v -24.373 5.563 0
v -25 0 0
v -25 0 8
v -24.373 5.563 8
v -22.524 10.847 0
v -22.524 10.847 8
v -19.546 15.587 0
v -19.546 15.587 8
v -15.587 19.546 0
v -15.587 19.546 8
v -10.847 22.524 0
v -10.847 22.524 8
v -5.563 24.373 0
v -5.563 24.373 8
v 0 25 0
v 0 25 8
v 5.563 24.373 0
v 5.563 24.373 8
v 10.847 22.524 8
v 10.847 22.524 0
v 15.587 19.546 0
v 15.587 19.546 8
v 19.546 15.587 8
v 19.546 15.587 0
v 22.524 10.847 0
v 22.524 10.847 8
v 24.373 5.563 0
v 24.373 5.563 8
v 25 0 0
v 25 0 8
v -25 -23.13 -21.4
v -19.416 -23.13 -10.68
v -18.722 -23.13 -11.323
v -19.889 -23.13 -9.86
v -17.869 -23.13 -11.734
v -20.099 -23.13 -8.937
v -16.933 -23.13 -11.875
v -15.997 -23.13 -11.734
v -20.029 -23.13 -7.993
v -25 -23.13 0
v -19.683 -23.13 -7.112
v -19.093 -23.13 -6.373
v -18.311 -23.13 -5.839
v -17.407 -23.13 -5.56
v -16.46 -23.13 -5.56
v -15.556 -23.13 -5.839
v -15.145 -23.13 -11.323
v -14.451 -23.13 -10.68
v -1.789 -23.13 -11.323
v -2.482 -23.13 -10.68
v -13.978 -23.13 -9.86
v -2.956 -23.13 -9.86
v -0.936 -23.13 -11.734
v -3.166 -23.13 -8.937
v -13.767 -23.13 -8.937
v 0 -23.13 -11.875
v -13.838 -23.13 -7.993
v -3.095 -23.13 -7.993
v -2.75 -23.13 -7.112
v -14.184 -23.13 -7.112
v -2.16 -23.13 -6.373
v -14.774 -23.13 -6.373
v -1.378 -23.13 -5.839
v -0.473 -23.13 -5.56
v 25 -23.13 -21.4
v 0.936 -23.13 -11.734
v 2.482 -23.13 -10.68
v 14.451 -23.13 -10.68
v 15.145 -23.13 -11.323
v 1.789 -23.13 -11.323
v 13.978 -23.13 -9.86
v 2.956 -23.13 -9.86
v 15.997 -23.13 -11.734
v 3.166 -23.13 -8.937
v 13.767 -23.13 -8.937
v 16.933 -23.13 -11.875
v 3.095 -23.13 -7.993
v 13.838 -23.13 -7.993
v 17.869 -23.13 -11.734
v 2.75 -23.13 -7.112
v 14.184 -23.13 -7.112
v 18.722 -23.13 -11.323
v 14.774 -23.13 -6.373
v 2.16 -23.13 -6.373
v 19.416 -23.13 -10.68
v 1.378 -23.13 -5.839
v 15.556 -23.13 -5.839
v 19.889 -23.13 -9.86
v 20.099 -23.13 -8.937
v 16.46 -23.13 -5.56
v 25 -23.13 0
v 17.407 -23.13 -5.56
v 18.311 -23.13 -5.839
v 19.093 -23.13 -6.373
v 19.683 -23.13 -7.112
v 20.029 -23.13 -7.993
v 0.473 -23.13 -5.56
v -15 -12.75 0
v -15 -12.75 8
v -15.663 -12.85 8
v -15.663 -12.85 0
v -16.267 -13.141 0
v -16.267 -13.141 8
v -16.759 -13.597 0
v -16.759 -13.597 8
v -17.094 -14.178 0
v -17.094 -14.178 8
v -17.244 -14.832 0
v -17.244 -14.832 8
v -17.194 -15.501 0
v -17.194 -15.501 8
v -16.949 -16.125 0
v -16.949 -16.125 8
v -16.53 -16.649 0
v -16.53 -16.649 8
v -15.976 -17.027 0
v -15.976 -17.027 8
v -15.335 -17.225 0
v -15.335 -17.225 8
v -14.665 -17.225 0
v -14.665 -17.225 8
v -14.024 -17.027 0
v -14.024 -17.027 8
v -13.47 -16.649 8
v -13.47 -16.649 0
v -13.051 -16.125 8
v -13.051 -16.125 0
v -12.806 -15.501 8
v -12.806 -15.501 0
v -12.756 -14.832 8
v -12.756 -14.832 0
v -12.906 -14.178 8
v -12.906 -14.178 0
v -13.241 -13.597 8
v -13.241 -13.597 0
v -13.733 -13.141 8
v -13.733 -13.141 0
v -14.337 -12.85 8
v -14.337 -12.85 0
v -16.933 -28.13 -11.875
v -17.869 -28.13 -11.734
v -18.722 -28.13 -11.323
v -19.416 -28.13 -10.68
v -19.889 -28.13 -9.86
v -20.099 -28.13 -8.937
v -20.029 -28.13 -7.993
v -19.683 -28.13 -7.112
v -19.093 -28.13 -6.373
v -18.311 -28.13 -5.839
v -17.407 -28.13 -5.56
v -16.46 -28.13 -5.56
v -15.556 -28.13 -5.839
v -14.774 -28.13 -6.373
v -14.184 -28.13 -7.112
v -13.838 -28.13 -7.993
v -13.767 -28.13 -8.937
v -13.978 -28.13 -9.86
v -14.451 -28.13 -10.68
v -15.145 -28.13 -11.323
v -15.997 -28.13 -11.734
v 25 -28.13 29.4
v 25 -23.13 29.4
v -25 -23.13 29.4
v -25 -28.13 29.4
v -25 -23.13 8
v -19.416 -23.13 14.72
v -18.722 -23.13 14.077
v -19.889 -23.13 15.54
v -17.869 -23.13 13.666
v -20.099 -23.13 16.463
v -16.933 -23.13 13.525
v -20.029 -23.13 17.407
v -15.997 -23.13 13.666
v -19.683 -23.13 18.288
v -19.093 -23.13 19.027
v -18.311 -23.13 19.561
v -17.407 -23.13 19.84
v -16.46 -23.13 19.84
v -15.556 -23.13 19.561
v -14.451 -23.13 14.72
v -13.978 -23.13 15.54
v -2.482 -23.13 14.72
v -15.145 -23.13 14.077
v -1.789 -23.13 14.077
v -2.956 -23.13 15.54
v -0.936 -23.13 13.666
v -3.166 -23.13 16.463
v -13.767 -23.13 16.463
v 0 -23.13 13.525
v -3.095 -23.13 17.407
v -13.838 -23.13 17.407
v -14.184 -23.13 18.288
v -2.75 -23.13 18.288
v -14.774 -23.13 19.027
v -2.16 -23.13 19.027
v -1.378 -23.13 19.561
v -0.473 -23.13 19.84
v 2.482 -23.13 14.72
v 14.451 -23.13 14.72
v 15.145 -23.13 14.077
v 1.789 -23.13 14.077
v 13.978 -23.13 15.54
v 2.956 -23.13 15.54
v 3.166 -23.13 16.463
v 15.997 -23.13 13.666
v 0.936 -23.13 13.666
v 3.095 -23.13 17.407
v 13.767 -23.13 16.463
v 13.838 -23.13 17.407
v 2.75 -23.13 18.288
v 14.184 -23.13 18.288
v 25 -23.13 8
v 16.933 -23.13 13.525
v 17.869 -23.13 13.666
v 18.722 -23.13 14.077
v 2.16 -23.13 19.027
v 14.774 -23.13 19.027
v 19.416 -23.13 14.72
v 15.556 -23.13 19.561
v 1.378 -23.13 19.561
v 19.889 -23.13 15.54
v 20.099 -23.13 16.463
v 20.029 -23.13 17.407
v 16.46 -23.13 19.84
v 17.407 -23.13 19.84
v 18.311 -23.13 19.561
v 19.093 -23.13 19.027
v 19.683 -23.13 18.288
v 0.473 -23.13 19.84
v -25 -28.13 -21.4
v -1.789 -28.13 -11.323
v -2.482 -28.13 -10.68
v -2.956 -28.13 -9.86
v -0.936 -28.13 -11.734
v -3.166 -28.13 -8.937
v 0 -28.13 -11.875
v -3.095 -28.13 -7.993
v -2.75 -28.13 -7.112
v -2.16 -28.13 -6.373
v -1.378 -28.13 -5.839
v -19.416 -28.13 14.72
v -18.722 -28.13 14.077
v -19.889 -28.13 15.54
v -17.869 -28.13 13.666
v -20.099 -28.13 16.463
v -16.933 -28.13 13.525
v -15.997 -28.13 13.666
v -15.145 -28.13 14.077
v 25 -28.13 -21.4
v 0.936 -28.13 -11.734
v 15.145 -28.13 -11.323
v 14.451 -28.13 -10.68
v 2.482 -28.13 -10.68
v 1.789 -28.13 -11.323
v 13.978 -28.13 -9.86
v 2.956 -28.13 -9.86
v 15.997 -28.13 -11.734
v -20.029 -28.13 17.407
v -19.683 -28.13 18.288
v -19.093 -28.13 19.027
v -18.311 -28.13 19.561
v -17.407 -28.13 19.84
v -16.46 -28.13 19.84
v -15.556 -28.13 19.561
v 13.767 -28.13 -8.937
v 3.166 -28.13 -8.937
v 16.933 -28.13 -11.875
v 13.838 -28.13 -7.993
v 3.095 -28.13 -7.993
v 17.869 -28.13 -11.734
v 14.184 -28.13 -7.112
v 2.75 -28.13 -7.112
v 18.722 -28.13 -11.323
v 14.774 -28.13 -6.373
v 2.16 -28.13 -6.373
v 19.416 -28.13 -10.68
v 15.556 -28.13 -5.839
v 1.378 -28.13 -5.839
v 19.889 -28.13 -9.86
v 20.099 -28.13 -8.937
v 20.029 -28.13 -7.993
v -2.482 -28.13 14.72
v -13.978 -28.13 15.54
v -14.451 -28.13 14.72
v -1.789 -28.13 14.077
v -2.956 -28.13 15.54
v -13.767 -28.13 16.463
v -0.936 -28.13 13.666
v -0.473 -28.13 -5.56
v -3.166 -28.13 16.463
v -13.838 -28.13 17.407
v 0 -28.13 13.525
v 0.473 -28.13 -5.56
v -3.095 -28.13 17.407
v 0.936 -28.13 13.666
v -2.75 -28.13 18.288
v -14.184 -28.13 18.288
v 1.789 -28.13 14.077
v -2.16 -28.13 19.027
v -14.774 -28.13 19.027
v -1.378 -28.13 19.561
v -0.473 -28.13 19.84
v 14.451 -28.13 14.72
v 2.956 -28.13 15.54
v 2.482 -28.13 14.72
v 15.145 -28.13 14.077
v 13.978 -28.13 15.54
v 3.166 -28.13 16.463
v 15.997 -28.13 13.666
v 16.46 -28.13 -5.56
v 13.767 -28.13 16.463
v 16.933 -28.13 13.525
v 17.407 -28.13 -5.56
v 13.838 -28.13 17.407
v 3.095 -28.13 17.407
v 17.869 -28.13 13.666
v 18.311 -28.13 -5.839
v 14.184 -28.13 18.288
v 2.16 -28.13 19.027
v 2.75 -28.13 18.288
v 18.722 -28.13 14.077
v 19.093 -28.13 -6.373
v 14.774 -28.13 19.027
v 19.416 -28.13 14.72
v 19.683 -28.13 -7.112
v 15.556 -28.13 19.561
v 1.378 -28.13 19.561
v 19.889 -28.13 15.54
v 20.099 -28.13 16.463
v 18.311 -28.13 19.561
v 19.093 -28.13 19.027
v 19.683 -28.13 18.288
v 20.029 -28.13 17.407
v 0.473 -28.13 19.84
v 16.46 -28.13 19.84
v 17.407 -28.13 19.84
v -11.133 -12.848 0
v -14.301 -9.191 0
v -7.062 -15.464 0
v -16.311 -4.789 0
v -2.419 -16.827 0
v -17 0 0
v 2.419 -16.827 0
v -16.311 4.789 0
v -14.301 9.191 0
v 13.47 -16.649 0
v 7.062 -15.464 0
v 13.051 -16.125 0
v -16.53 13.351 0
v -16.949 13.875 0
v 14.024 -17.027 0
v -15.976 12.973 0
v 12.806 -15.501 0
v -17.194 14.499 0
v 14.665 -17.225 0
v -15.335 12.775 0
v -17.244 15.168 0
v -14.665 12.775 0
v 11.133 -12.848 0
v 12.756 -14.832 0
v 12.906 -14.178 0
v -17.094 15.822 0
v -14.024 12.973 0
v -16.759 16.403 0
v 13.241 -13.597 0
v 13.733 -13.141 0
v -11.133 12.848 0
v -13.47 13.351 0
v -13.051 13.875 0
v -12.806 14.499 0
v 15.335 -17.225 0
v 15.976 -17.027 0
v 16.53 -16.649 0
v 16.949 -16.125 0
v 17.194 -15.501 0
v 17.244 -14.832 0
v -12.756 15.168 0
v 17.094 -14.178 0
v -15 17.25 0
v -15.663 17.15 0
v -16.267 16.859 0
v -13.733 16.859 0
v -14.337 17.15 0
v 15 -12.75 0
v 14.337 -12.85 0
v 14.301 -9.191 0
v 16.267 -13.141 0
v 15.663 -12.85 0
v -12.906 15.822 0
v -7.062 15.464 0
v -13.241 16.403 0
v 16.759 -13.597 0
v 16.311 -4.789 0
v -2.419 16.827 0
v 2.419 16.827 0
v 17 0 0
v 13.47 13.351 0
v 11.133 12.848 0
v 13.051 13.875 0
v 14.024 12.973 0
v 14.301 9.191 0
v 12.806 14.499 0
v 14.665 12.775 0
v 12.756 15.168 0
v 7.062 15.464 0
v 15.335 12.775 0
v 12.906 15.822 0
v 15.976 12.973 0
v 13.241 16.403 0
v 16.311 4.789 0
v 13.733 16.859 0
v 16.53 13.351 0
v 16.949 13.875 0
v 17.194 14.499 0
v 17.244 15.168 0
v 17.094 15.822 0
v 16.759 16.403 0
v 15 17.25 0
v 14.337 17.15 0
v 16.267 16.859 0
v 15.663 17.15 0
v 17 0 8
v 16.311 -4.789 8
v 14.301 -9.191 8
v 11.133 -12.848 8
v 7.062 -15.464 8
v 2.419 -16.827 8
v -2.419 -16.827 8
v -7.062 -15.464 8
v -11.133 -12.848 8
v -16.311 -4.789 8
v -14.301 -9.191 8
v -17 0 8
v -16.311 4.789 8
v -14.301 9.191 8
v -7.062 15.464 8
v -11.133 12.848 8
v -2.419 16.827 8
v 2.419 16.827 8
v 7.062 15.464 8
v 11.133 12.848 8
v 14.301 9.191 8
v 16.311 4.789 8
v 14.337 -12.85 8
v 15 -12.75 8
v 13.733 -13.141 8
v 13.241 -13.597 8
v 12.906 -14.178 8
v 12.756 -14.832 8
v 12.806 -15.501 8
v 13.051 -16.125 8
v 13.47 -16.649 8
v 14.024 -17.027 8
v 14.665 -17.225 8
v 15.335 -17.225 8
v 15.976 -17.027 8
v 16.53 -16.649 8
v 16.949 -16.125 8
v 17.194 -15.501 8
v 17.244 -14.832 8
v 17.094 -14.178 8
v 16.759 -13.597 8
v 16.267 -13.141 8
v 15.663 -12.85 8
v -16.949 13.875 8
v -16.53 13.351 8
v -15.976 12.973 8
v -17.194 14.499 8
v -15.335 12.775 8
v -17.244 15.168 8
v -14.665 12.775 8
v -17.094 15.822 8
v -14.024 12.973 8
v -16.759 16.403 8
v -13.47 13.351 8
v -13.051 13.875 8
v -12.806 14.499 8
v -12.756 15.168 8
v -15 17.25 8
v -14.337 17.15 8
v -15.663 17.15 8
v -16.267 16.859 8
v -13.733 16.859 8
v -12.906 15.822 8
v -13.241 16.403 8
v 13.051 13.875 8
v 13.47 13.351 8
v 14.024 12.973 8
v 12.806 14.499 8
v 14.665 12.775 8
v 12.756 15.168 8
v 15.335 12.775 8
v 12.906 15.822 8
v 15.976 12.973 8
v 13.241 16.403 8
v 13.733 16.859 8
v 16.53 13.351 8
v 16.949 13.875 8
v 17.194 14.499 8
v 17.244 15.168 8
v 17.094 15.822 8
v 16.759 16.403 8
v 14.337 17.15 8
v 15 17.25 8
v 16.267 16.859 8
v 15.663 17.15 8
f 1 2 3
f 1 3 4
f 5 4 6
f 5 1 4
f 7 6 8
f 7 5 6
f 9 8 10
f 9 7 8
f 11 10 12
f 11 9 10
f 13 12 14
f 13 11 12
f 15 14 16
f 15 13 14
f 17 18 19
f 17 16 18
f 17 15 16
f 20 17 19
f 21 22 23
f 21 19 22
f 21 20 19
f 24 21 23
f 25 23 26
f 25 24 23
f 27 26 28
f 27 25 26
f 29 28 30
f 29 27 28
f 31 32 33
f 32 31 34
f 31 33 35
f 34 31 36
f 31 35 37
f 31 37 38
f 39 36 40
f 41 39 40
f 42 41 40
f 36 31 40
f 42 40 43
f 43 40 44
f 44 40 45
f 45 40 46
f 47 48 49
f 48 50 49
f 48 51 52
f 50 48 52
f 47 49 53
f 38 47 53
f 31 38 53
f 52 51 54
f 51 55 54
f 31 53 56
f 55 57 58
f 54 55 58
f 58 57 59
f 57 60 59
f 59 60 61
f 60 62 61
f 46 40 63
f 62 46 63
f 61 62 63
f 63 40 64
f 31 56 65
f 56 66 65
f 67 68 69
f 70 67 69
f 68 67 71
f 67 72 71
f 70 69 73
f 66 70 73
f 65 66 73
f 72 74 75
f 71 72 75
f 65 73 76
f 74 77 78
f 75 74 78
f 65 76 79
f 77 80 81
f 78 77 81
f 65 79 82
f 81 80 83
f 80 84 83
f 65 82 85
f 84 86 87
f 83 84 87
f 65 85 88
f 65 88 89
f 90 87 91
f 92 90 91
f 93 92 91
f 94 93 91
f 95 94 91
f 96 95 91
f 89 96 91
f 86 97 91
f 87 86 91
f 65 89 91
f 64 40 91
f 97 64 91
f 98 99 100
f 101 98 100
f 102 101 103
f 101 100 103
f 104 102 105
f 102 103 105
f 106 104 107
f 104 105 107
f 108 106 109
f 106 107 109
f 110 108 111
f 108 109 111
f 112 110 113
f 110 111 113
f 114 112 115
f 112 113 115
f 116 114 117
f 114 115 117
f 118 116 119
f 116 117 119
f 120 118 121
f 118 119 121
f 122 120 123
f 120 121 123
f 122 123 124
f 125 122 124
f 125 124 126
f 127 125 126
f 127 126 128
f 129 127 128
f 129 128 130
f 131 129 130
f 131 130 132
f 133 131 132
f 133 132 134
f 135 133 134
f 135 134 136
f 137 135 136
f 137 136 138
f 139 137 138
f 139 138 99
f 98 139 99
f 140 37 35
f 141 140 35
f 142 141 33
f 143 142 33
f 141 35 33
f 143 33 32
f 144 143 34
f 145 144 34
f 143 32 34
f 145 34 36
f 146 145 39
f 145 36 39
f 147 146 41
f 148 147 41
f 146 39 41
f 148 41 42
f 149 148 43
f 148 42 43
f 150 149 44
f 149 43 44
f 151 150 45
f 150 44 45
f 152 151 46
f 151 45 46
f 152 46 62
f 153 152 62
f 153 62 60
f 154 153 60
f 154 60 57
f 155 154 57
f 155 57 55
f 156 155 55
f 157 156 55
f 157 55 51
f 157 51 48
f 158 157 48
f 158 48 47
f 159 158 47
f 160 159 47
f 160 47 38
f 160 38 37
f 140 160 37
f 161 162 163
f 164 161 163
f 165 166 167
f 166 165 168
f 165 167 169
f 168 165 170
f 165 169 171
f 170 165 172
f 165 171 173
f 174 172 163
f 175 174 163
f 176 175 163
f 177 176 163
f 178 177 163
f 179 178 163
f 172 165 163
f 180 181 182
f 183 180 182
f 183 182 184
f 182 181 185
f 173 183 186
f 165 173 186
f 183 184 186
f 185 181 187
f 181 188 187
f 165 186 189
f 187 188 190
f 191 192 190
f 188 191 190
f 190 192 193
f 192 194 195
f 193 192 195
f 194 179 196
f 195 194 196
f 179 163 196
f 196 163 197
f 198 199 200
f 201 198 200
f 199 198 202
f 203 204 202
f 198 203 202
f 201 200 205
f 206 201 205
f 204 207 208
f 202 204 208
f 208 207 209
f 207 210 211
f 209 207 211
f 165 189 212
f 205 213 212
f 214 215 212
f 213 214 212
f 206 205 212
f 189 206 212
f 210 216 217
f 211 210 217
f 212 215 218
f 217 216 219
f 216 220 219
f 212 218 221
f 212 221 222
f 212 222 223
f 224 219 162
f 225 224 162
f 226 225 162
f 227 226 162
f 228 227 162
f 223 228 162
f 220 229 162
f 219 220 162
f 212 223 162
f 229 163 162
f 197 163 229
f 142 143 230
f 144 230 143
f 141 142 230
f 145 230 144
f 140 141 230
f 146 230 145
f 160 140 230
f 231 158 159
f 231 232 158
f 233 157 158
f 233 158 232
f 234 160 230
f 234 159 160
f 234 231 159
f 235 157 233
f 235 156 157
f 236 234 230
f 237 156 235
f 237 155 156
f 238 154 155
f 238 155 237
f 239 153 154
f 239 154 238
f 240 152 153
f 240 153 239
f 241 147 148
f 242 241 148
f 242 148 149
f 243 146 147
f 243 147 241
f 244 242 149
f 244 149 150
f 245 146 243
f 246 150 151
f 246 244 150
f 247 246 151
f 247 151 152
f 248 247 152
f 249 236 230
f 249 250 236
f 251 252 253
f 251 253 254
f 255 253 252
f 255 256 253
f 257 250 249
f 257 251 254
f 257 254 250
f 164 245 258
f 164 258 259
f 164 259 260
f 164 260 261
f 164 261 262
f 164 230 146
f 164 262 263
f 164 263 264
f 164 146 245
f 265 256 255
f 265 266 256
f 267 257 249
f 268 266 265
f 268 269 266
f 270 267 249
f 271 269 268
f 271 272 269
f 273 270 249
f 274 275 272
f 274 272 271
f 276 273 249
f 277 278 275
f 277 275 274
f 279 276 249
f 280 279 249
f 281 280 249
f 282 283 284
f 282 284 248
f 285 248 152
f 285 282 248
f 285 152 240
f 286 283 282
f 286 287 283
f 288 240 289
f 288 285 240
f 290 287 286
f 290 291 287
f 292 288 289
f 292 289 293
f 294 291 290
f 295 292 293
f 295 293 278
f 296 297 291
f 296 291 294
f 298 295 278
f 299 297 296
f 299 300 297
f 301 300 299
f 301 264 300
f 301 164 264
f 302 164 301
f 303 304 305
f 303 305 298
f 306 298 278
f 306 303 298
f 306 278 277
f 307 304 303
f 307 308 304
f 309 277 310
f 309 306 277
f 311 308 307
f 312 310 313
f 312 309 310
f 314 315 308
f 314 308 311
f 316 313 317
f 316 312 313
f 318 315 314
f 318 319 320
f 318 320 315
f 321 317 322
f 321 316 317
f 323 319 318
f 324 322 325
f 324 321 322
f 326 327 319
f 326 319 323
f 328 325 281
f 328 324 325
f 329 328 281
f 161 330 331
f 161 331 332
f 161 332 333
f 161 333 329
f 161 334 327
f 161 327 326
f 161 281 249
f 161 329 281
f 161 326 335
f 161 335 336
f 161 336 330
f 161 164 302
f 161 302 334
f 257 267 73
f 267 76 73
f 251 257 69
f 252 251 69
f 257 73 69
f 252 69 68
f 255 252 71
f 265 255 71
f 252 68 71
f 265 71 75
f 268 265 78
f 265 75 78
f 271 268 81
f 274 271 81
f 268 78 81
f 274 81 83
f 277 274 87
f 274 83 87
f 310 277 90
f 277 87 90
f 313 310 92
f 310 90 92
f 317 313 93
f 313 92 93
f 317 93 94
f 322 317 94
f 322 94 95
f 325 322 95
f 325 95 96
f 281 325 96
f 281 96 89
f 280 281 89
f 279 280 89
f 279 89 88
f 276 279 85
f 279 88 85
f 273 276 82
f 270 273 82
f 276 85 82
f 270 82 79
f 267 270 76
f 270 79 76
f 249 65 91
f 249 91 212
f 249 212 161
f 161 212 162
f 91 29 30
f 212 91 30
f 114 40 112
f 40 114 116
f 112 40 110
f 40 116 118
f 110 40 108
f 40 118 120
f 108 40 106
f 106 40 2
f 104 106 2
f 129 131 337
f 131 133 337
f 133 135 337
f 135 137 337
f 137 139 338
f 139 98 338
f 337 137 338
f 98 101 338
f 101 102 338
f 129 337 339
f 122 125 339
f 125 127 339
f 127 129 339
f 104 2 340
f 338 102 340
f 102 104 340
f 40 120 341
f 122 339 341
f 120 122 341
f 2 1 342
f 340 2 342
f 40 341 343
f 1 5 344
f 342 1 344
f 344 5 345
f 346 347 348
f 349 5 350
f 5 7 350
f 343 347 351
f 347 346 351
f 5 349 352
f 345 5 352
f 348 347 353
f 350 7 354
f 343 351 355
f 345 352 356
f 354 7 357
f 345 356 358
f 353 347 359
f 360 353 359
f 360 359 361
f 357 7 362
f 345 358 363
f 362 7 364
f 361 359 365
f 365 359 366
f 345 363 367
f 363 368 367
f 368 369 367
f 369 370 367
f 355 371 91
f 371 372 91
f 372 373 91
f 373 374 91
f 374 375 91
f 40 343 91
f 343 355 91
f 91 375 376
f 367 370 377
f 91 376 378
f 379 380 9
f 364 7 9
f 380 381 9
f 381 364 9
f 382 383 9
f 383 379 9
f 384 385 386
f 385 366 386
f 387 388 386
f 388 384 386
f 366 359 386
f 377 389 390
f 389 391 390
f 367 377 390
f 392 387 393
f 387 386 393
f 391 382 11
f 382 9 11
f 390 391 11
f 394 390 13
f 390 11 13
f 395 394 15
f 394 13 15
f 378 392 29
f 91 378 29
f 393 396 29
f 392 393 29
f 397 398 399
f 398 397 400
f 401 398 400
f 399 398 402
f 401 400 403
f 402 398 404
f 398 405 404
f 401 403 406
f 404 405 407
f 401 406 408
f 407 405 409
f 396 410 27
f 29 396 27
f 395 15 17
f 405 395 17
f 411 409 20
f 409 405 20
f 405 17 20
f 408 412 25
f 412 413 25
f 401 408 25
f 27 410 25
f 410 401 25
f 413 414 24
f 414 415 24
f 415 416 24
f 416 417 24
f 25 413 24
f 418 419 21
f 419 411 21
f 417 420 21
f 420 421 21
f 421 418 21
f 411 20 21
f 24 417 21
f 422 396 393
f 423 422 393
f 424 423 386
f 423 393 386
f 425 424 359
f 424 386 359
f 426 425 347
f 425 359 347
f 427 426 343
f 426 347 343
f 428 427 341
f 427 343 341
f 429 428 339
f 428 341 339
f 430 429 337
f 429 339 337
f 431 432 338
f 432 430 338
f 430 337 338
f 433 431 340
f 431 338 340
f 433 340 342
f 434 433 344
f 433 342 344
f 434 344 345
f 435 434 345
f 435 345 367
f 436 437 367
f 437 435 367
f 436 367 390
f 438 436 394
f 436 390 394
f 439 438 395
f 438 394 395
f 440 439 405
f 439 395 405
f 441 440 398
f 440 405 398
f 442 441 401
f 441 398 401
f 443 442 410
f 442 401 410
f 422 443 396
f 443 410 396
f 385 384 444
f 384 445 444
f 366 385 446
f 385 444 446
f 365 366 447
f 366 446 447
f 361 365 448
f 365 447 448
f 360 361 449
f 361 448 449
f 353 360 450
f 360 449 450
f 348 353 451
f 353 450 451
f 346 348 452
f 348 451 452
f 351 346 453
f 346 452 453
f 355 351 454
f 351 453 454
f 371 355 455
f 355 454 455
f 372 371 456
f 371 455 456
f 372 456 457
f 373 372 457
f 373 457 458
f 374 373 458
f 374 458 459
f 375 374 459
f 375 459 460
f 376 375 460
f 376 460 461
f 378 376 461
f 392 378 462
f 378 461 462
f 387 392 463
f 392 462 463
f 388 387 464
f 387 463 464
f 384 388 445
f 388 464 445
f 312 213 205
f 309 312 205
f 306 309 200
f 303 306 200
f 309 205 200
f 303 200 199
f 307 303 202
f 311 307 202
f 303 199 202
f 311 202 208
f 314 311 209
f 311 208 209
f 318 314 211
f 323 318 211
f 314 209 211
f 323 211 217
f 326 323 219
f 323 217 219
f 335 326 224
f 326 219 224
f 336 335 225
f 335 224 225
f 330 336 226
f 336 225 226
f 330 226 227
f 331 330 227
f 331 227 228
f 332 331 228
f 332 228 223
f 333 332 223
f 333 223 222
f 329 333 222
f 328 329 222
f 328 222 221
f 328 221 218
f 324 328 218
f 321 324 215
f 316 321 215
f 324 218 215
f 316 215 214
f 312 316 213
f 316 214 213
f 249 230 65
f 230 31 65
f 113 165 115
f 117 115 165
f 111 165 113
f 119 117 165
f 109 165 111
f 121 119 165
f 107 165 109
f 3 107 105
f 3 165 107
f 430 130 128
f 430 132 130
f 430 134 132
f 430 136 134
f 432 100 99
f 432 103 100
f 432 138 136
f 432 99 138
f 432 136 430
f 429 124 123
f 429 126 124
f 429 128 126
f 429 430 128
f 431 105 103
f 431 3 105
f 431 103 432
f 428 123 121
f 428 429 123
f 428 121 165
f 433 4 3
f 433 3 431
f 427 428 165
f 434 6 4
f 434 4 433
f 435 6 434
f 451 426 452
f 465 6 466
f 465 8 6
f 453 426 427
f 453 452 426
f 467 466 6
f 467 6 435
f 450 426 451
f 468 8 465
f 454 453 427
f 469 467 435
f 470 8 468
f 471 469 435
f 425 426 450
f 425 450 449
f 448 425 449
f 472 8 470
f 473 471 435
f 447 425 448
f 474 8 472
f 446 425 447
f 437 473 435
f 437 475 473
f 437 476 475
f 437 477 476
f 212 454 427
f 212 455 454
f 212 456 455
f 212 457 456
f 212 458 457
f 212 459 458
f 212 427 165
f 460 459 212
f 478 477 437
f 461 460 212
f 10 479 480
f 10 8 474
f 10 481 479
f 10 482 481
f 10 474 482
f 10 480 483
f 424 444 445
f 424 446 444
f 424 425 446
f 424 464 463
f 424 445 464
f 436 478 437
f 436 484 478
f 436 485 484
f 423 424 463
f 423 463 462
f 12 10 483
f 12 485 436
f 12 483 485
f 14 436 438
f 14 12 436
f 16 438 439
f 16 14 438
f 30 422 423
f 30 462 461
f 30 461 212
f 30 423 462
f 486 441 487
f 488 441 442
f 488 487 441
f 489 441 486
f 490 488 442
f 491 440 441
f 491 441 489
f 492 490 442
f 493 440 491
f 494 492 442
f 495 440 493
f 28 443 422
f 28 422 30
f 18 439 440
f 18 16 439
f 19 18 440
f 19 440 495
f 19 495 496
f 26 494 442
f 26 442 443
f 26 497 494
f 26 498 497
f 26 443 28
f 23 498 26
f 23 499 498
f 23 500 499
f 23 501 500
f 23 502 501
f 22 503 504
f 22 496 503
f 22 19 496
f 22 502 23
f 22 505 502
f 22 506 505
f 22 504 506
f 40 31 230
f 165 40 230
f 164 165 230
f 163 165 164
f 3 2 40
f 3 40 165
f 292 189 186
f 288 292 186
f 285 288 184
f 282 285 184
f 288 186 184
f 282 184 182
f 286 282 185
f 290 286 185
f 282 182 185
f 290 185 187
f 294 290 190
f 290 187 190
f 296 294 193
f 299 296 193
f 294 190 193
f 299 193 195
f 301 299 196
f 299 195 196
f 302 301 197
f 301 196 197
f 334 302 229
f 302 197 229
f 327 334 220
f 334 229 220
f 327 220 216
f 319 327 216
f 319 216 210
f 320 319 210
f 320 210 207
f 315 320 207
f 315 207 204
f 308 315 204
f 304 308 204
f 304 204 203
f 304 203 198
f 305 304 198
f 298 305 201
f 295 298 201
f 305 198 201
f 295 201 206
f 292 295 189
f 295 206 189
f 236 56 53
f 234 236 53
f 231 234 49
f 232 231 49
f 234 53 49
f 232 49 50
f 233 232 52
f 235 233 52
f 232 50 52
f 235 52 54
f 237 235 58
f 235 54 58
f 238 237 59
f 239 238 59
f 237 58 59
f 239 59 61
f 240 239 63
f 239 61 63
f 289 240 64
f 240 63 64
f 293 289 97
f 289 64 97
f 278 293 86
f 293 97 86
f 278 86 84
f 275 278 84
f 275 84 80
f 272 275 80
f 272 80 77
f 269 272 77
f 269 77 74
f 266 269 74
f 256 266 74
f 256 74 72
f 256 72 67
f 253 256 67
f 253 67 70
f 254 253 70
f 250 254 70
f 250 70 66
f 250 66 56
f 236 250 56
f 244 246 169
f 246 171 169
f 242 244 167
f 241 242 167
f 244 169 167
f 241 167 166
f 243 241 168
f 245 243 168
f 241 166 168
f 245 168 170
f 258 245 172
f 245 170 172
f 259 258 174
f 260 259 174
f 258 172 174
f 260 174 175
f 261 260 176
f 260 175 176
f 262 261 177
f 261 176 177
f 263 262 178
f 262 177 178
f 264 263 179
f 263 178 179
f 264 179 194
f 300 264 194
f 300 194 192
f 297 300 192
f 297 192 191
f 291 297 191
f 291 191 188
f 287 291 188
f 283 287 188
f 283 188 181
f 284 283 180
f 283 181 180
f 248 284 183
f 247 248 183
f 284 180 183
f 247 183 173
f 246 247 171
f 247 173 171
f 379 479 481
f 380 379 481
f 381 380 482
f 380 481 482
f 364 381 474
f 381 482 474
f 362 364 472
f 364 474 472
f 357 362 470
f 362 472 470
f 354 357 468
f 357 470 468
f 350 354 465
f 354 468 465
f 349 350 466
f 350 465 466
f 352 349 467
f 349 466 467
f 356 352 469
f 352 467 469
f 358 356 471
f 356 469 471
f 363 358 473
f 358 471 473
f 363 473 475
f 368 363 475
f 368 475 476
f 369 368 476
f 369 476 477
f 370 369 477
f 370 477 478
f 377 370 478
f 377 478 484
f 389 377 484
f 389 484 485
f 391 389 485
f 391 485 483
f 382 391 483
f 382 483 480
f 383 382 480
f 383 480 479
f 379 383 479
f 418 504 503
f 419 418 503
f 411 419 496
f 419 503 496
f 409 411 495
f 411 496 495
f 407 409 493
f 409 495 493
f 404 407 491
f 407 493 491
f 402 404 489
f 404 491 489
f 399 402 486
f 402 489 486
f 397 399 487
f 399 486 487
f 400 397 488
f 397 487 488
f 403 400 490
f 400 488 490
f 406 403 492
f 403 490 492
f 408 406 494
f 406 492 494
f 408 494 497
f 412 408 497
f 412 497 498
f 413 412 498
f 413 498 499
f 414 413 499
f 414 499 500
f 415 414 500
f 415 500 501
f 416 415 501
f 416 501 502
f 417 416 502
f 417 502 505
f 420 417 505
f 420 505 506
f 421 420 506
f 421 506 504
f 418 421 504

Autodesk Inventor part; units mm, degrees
ref_plane "YZ Plane" through (0, 0, 0) normal (1, 0, 0) x (0, 1, 0)
ref_plane "XZ Plane" through (0, 0, 0) normal (0, 1, 0) x (-1, 0, 0)
ref_plane "XY Plane" through (0, 0, 0) normal (0, 0, 1) x (1, 0, 0)
sketch "Sketch1" plane through (0, 0, 0) normal (0, 0, 1) x (1, 0, 0)
  circle A0 centre (0, 0) radius 17
  arc A1 (25, 0) -> (-25, 0) centre (0, 0) ccw
  line L0 (-25, 0) -> (-25, -23.1305)
  line L1 (-25, -23.1305) -> (25, -23.1305)
  line L2 (25, -23.1305) -> (25, 0)
  circle A2 centre (-15, 15) radius 2.25
  circle A3 centre (15, 15) radius 2.25
  circle A4 centre (-15, -15) radius 2.25
  circle A5 centre (15, -15) radius 2.25
  dimension "d0" = 34
  dimension "d1" = 50
  dimension "d2" = 50
  dimension "d3" = 23.1305
  dimension "d54" = 4.5
  dimension "d57" = 30
  dimension "d60" = 30
  dimension "d63" = 15
  dimension "d64" = 15
extrude "Extrusion1" add sketch "Sketch1" along normal blind 8 contours L2 L1 L0 A1 | A2 | A3 | A4 | A5
sketch "Sketch2" plane through (-25, -23.1305, 0) normal (0, -1, 0) x (1, 0, 0)
  line L0 (0, 0) -> (50, 0) construction
  line L1 (0, 0) -> (0, 8) projected
  line L2 (0, -21.4) -> (50, -21.4)
  line L3 (50, -21.4) -> (50, 29.4)
  line L4 (50, 29.4) -> (0, 29.4)
  line L5 (0, 29.4) -> (0, -21.4)
  line L6 (0, -21.4) -> (50, 29.4) construction
  line L7 (50, -21.4) -> (0, 29.4) construction
  point P0 (25, 0)
  point P1 (25, 4)
  point P2 (25, 4)
  point P3 (0, 4)
  point P4 (25, 4)
  point P5 (25, 0)
  point P6 (50, 8)
  dimension "d7" = 50.8
  dimension "d65" = 50
  dimension "d66" = 50
extrude "Extrusion2" add sketch "Sketch2" along normal blind 5
sketch "Sketch3" plane through (-25, -28.1305, 0) normal (0, -1, 0) x (1, 0, 0)
  line L0 (50, 29.4) -> (0, 29.4) projected
  line L1 (0, 29.4) -> (0, -21.4) projected
  point P0 (25, 0)
  point P1 (8.0667, 16.7)
  point P2 (25, 16.7)
  point P3 (8.0667, -8.7)
  point P4 (25, -8.7)
  point P5 (41.9333, 16.7)
  point P6 (41.9333, -8.7)
  dimension "d39" = 16.9333
  dimension "d42" = 25.4
  dimension "d45" = 12.7
  dimension "d67" = 50
  dimension "d68" = 50.8
  dimension "d70" = 8.0667
hole "Hole2" at (-16.9333, -28.1305, 16.7) at (0, -28.1305, 16.7) at (-16.9333, -28.1305, -8.7) at (0, -28.1305, -8.7) at (16.9333, -28.1305, 16.7) at (16.9333, -28.1305, -8.7) direction (0, 1, 0) diameter 6.35 end through all
sketch "Sketch4" plane through (0, 0, 0) normal (0, 0, -1) x (-1, 0, 0)
  circle A0 centre (0, 0) radius 17 projected
  line L0 (25, 0) -> (25, -23.1305) projected
  line L1 (25, -23.1305) -> (-25, -23.1305) projected
  point P0 (-15, 15)
  point P1 (15, 15)
  point P2 (-15, -15)
  point P3 (15, -15)
  dimension "d80" = 30
  dimension "d83" = 30
  dimension "d86" = 15
  dimension "d87" = 15
hole "Hole3" at (15, 15, 0) at (-15, 15, 0) at (15, -15, 0) at (-15, -15, 0) direction (0, 0, 1) diameter 4.5 end through all
equation "\"d2\" = d1"
equation "\"d63\" = 0.5 * d60"
equation "\"d64\" = d63"
equation "\"d65\" = d66"
equation "\"d70\" = -d39 + 0.5 * d67"
equation "\"d83\" = d80"
equation "\"d86\" = 0.5 * d80"
equation "\"d87\" = d86"
properties part number "ff12_mount"
